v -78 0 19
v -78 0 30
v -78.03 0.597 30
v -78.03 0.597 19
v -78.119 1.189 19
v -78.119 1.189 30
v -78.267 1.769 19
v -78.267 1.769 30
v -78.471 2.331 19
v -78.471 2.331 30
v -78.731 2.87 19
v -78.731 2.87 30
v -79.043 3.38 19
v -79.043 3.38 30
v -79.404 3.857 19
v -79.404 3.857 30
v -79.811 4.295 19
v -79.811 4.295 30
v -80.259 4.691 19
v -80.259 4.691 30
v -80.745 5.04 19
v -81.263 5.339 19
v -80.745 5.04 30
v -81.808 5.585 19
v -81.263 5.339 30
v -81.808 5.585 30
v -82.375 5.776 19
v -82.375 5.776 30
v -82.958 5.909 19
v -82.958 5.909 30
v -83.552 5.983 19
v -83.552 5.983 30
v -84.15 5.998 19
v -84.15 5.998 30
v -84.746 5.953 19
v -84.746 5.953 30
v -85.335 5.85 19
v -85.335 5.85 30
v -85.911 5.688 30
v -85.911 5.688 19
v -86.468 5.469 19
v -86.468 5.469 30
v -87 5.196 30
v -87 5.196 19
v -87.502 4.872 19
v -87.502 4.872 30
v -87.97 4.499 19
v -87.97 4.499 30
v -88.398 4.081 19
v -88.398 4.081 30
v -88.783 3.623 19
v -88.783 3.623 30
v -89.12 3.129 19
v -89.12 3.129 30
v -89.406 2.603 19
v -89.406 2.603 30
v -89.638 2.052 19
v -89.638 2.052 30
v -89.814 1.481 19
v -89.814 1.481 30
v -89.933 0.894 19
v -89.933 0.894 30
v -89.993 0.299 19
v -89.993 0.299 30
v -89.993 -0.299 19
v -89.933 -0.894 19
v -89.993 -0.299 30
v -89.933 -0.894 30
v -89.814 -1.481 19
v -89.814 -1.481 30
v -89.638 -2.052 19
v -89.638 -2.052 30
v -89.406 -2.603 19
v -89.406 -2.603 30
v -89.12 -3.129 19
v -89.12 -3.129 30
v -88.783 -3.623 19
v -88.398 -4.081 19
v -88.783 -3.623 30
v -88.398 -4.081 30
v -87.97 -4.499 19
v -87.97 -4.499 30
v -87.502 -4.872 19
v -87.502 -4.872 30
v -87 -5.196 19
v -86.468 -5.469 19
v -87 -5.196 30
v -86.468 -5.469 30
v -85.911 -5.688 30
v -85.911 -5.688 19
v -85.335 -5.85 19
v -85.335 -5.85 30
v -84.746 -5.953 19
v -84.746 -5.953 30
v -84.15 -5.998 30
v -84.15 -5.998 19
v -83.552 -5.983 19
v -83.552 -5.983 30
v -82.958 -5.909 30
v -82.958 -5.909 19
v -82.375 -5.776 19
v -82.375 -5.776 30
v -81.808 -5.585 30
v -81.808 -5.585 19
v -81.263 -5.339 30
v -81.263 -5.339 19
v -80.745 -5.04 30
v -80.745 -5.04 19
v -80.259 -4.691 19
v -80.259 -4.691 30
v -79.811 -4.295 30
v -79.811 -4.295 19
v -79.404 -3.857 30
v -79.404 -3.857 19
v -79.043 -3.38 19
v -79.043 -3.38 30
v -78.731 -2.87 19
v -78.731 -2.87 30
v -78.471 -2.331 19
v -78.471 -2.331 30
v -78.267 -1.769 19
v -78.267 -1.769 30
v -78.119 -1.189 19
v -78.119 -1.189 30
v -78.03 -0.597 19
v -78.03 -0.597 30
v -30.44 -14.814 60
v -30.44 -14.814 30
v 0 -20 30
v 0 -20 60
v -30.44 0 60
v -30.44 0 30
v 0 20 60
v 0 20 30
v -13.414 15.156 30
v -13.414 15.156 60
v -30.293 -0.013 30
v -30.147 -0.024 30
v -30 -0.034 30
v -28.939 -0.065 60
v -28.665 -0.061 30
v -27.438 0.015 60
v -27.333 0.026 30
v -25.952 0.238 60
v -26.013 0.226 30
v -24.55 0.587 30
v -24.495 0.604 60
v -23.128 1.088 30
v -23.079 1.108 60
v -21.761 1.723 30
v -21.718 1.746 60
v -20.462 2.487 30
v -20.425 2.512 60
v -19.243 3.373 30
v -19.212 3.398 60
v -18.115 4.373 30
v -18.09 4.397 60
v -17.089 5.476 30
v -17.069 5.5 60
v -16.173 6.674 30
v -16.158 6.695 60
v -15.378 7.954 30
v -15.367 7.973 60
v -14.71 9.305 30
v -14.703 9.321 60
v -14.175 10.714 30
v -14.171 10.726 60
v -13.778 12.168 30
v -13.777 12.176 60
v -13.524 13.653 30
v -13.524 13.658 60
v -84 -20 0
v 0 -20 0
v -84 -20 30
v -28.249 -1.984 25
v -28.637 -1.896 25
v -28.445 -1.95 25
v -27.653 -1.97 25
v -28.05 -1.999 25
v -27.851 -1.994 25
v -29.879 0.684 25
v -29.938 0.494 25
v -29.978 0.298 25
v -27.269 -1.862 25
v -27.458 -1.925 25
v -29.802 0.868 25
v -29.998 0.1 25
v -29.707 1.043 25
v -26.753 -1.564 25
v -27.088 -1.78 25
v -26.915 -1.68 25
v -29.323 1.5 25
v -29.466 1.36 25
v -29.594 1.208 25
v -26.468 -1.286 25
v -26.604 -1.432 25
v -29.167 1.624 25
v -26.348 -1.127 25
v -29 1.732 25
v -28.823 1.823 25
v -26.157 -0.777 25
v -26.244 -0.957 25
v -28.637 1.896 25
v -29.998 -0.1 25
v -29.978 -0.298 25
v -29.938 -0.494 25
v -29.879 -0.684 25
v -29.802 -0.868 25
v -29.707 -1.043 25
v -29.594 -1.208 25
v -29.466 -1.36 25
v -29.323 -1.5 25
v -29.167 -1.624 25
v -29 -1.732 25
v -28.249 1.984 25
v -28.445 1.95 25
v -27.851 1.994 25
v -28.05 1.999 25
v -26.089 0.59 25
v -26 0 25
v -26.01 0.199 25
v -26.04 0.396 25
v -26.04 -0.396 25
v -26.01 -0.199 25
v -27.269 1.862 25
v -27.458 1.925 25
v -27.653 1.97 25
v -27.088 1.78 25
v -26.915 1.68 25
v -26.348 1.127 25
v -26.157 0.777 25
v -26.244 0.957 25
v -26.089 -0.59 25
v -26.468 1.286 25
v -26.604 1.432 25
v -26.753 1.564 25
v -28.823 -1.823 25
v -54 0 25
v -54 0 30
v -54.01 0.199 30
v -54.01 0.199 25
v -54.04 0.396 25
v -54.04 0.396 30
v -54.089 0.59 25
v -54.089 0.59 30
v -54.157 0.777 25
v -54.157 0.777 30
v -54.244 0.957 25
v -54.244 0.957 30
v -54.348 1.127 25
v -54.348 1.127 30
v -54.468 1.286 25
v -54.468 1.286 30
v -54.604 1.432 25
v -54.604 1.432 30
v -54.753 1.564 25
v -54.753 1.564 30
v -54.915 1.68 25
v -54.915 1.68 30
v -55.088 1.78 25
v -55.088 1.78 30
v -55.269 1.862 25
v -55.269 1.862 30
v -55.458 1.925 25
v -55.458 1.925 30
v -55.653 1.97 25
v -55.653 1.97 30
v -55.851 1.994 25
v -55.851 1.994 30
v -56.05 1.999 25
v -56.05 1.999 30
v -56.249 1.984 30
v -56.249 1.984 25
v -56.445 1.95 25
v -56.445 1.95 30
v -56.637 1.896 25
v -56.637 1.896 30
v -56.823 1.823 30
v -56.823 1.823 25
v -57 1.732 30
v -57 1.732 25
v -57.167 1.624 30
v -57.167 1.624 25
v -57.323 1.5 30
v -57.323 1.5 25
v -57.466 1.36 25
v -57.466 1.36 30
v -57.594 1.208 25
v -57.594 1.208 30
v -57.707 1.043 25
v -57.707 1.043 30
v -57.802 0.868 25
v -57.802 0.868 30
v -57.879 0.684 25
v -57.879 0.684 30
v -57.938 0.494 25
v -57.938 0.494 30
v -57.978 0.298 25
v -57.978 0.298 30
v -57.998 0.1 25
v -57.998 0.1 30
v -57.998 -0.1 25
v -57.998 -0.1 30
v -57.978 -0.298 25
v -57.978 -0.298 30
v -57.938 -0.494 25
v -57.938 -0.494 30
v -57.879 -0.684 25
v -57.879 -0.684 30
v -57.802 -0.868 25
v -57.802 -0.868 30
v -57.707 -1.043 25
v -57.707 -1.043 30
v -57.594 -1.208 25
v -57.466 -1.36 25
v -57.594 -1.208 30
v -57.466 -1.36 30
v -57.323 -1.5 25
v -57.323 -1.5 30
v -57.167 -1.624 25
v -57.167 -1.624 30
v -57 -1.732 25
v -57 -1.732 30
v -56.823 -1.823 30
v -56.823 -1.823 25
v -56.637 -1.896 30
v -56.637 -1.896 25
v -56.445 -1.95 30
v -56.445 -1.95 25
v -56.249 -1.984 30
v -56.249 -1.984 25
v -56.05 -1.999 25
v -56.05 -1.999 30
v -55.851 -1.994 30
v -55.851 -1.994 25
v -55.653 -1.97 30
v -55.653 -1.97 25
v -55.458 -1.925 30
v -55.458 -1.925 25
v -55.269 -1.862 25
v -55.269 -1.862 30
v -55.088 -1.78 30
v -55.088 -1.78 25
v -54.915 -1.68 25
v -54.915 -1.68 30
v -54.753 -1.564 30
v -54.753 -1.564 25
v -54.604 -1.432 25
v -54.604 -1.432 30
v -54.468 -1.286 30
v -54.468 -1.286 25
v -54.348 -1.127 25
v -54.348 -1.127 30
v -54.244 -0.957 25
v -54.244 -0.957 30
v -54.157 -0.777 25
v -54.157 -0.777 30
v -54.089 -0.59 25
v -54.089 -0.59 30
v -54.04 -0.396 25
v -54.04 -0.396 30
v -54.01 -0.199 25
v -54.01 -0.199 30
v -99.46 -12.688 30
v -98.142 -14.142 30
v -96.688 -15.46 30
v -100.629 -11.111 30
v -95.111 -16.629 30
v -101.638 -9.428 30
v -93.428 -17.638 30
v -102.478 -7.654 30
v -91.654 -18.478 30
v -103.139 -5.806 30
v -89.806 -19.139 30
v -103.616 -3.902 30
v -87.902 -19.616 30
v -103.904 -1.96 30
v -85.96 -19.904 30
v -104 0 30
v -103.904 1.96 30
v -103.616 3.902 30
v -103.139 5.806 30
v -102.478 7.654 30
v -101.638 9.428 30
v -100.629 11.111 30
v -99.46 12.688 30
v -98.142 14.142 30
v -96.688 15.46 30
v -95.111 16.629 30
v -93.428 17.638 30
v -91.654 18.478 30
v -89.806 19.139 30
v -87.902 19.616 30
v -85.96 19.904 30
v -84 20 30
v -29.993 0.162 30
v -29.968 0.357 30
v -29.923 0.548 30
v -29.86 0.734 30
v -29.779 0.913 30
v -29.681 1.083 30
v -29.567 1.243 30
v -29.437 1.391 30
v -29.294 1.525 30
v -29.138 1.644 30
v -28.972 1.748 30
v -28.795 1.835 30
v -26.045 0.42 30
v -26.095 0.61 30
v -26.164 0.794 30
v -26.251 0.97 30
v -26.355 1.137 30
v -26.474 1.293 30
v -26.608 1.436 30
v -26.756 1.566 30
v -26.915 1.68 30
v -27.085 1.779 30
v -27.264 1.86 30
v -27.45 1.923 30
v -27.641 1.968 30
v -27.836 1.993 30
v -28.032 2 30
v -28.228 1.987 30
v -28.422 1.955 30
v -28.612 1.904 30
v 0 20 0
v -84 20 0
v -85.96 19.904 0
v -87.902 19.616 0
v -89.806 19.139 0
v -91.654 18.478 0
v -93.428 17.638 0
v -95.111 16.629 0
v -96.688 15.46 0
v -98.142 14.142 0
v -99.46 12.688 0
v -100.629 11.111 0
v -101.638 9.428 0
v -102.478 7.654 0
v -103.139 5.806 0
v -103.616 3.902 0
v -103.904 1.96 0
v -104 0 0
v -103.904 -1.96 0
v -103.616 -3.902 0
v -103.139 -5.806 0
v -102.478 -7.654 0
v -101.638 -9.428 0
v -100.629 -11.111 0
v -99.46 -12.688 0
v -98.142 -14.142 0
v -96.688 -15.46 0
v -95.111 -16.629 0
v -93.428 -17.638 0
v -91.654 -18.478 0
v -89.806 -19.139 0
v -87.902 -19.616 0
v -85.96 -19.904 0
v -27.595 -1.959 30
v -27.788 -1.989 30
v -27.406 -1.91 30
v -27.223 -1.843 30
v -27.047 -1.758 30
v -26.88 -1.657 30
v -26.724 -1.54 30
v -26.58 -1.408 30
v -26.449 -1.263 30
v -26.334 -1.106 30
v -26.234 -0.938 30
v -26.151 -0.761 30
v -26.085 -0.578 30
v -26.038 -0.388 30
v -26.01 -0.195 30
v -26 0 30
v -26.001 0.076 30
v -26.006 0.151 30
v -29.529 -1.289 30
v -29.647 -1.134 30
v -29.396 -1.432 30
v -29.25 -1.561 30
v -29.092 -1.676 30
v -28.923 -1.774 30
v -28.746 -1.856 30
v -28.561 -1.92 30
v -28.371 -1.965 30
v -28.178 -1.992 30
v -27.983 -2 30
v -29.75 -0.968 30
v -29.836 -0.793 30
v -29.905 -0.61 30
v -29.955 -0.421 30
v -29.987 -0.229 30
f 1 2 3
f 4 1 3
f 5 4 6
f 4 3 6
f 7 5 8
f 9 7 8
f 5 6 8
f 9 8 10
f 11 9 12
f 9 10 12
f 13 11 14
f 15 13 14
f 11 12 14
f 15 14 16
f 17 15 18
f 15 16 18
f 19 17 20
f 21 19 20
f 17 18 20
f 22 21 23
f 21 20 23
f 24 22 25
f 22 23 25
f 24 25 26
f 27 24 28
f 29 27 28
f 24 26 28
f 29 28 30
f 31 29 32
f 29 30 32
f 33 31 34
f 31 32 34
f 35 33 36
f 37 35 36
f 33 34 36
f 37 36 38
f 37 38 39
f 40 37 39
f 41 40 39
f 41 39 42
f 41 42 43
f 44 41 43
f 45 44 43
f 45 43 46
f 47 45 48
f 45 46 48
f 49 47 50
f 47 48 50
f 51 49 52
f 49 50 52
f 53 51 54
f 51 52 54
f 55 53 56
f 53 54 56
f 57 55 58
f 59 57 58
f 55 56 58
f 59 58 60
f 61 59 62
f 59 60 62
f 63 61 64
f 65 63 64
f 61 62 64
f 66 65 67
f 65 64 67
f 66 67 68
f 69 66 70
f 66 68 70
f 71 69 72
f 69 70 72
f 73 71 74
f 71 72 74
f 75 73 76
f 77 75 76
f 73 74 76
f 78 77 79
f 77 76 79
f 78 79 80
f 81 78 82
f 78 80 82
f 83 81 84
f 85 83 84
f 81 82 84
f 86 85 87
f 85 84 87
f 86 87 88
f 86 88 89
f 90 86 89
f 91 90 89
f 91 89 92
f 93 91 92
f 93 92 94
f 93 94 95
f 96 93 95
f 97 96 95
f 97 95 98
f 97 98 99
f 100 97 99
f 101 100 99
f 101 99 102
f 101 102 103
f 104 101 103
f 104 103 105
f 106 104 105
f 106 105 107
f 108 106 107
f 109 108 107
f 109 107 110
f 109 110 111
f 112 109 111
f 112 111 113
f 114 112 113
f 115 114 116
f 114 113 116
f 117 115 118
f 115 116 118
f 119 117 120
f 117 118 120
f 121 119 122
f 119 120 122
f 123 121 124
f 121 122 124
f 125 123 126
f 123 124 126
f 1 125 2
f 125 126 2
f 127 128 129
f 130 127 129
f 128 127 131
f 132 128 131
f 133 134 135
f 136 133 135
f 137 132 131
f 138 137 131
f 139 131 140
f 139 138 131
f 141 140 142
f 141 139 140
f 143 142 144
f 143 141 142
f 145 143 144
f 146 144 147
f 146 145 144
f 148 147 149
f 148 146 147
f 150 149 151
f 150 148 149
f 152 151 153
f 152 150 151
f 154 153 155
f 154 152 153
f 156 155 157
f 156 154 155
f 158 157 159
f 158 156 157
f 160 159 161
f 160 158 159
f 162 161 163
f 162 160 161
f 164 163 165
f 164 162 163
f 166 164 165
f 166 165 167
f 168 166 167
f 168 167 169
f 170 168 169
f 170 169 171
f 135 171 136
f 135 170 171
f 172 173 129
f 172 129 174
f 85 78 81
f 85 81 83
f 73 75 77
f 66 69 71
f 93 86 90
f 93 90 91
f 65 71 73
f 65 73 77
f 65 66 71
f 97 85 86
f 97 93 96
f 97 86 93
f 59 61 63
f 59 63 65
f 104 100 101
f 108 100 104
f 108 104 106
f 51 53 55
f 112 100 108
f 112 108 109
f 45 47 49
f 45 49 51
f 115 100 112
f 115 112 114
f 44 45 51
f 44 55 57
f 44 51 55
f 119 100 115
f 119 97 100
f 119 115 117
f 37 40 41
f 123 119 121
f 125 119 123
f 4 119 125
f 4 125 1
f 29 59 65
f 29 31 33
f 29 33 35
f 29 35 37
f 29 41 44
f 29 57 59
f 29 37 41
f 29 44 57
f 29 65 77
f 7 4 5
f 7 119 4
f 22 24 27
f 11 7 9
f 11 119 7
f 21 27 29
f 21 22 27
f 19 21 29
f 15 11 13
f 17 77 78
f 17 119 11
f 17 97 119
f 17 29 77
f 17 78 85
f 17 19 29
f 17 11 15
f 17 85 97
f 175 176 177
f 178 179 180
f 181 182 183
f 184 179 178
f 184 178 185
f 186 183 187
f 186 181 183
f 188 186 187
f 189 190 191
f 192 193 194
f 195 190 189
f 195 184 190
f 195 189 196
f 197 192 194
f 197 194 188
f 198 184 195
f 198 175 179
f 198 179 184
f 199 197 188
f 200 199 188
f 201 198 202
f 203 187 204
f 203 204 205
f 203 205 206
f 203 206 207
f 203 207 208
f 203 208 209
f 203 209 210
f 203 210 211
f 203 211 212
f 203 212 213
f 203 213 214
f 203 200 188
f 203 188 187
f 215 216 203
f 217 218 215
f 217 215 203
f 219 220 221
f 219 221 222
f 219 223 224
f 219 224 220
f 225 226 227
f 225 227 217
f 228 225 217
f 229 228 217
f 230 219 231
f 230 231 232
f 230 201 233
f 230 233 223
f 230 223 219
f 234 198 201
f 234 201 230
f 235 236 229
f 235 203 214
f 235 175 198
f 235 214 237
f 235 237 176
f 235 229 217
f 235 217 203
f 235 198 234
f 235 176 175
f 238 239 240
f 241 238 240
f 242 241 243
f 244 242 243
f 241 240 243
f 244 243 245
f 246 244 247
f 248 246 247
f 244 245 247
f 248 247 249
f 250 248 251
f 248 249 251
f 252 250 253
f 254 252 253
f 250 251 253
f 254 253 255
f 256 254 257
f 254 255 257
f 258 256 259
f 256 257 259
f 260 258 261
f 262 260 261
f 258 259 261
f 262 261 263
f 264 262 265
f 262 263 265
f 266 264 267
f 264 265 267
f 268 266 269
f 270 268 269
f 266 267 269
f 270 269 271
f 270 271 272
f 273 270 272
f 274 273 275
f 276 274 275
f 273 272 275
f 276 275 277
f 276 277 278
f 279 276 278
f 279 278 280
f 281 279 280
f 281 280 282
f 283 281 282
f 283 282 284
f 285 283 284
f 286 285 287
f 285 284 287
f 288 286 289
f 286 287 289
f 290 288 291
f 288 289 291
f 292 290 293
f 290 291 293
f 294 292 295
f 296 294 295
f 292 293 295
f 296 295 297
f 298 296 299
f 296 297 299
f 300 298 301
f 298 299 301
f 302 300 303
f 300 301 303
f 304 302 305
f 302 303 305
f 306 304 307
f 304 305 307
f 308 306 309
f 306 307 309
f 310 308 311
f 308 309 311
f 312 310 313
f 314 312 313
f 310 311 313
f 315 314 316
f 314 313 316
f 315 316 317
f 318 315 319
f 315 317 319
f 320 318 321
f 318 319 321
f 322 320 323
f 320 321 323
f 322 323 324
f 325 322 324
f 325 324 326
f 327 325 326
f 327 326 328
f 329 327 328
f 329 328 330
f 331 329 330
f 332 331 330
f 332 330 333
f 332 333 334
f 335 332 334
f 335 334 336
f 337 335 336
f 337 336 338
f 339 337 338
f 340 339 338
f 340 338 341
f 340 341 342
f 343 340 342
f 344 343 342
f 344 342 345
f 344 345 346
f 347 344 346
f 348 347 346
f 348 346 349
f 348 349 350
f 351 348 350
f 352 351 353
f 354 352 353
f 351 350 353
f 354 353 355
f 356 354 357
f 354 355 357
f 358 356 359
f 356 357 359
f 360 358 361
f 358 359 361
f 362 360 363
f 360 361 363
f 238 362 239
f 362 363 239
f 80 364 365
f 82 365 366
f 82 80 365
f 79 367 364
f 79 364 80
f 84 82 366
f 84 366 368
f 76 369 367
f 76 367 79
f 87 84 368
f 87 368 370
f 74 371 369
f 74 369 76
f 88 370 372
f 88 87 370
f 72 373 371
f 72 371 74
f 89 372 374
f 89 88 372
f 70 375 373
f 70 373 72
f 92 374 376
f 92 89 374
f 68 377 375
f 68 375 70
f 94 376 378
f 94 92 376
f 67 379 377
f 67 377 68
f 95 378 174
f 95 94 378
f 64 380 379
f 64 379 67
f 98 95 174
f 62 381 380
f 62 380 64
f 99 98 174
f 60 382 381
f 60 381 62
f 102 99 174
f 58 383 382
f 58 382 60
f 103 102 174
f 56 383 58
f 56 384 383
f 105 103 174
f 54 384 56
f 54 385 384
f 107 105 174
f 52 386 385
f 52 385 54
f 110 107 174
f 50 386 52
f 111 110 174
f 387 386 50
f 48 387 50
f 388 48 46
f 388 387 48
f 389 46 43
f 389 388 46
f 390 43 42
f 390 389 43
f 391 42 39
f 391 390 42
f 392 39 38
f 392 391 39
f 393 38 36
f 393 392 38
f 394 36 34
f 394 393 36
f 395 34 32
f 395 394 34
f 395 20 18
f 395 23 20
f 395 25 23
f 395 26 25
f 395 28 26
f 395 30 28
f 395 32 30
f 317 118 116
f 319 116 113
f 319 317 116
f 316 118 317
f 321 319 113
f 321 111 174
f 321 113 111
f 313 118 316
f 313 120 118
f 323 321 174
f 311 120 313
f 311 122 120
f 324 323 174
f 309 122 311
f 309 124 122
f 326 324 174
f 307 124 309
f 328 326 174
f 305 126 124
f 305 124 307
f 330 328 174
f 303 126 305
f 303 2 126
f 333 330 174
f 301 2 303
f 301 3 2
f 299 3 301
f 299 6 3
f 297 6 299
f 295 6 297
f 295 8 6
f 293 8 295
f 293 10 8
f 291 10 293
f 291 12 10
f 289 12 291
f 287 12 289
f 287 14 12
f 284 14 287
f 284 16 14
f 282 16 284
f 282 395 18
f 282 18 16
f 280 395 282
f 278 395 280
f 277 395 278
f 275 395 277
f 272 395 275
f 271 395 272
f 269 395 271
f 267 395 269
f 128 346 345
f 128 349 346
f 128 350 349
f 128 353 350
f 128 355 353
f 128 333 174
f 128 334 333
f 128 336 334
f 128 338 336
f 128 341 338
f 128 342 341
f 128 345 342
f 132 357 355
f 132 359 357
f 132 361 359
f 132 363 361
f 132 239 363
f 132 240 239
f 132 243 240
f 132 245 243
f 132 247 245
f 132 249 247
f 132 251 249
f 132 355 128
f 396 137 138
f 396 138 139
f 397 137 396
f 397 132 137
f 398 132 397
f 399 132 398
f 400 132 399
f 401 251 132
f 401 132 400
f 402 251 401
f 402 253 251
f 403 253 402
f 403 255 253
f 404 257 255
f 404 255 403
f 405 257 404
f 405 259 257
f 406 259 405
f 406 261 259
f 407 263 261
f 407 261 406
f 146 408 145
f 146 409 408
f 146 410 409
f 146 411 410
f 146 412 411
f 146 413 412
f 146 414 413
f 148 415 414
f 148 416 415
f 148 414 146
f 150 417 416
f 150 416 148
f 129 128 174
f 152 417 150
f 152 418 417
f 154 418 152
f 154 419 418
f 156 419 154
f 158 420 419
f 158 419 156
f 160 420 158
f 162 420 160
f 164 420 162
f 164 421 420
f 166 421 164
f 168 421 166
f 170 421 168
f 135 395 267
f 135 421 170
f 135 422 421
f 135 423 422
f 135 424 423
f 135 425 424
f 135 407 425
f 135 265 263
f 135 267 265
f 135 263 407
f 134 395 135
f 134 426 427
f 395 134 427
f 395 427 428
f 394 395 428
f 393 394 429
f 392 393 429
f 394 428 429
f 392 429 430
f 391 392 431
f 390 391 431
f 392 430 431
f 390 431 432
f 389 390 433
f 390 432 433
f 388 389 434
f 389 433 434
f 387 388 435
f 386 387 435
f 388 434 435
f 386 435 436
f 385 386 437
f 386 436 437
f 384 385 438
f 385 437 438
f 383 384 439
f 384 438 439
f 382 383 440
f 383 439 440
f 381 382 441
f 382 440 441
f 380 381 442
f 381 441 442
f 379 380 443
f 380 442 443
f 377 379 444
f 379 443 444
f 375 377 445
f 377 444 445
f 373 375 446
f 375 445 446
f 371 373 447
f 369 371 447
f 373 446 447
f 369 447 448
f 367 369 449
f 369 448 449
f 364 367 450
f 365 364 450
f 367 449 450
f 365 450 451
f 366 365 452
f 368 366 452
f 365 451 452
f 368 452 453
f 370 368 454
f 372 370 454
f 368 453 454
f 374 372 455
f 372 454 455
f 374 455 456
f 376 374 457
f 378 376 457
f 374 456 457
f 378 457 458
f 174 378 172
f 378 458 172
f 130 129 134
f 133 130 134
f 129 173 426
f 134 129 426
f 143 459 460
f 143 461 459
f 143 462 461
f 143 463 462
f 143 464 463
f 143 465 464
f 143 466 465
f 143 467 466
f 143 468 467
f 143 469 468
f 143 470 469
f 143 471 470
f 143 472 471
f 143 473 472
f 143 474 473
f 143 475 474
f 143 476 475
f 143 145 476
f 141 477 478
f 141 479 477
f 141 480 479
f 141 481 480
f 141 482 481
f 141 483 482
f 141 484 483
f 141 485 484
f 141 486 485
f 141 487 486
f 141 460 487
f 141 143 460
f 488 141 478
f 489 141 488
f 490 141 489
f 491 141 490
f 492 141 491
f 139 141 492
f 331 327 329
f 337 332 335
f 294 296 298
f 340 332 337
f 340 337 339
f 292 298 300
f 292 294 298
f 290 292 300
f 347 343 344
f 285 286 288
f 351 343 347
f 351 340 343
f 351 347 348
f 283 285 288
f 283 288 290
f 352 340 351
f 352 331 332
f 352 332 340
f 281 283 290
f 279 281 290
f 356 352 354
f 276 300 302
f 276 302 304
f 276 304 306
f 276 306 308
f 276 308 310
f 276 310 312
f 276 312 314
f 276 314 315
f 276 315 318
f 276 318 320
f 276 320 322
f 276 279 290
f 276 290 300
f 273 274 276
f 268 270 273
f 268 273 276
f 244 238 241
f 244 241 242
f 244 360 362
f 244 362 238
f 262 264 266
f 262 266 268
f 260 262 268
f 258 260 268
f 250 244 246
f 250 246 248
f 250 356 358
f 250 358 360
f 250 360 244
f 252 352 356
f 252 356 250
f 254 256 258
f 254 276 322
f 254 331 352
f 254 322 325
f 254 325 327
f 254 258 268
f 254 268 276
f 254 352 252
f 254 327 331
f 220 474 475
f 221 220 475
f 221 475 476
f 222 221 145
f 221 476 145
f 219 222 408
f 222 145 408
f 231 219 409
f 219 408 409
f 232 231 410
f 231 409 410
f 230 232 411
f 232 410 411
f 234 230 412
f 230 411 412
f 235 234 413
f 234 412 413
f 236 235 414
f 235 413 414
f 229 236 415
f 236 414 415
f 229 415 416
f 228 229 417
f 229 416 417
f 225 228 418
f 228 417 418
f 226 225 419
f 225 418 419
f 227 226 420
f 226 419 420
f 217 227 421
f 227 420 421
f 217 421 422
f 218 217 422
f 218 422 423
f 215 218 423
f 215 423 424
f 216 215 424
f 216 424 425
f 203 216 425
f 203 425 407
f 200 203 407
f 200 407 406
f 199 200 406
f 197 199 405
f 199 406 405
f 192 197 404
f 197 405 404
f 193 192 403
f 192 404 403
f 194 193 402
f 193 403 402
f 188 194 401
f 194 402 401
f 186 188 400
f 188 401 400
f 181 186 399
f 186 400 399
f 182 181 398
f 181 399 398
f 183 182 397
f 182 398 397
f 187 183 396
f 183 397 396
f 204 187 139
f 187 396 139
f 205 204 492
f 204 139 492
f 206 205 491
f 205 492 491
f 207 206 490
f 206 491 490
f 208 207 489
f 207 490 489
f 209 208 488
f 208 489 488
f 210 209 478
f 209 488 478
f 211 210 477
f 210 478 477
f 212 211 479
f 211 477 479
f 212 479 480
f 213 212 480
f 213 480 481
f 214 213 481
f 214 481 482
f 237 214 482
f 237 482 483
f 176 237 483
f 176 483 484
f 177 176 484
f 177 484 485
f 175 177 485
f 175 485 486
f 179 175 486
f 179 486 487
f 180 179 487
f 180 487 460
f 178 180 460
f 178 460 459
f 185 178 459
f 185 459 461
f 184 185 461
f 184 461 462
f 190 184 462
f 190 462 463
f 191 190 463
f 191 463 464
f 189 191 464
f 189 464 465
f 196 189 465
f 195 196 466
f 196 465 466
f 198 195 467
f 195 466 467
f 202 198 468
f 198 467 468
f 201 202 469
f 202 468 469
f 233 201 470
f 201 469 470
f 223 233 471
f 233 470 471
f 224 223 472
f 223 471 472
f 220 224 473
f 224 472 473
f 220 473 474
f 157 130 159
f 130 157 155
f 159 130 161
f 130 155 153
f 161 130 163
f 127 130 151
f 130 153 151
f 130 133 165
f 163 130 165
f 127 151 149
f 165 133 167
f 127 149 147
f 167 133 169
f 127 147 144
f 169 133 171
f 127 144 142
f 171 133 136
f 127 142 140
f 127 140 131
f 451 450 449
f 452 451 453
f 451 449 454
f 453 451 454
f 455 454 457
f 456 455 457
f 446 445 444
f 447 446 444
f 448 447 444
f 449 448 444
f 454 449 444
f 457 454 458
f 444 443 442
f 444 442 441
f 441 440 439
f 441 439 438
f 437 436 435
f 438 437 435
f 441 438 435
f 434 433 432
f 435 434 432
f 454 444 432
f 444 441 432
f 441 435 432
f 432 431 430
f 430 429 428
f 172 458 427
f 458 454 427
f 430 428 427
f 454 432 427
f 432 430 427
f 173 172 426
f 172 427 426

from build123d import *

# Parameters (mm, degrees)
PAD_DEPTH           = 30
SKETCH001_R         = 6
POCKET_DEPTH        = 11
SKETCH002_R         = 2
POCKET001_DEPTH     = 5
LINEARPATTERN_COUNT = 2
LINEARPATTERN_PITCH = 28
PAD001_DEPTH        = 30


with BuildPart() as part:
    # Sketch → Pad (new body)
    with BuildSketch(Plane.XY):
        with BuildLine():
            Line((0, 20), (-84, 20))
            ThreePointArc((-84, 20), (-104, 0), (-84, -20))
            Line((0, -20), (-84, -20))
            Line((0, 20), (0, -20))
        make_face()
    extrude(amount=PAD_DEPTH)

    # Sketch001 (on Face6 of Pad) → Pocket (cut)
    with BuildSketch(Plane.XY.offset(30)):
        with Locations((-84, 0)):
            Circle(SKETCH001_R)
    extrude(amount=-POCKET_DEPTH, mode=Mode.SUBTRACT)

    # Sketch002 (on Face5 of Pocket) → Pocket001 (cut)
    with BuildSketch(Plane.XY.offset(30)):
        with Locations((-56, 0)):
            Circle(SKETCH002_R)
    pocket001 = extrude(amount=-POCKET001_DEPTH, mode=Mode.SUBTRACT)

    # LinearPattern: Pocket001 ×2
    with Locations(*[(i * LINEARPATTERN_PITCH, 0, 0) for i in range(1, LINEARPATTERN_COUNT)]):
        add(pocket001, mode=Mode.SUBTRACT)

    # Sketch003 (on Face5 of LinearPattern) → Pad001 (join)
    with BuildSketch(Plane.XY.offset(30)):
        with BuildLine():
            Line((-30.44, -14.81438), (-30.44, 0))
            ThreePointArc((-30.44, 0), (-18.638963, 3.884356), (-13.414303, 15.156251))
            Line((0, 20), (-13.414303, 15.156251))
            Line((0, -20), (0, 20))
            Line((-30.44, -14.81438), (0, -20))
        make_face()
    extrude(amount=PAD001_DEPTH)


solid = part.part
